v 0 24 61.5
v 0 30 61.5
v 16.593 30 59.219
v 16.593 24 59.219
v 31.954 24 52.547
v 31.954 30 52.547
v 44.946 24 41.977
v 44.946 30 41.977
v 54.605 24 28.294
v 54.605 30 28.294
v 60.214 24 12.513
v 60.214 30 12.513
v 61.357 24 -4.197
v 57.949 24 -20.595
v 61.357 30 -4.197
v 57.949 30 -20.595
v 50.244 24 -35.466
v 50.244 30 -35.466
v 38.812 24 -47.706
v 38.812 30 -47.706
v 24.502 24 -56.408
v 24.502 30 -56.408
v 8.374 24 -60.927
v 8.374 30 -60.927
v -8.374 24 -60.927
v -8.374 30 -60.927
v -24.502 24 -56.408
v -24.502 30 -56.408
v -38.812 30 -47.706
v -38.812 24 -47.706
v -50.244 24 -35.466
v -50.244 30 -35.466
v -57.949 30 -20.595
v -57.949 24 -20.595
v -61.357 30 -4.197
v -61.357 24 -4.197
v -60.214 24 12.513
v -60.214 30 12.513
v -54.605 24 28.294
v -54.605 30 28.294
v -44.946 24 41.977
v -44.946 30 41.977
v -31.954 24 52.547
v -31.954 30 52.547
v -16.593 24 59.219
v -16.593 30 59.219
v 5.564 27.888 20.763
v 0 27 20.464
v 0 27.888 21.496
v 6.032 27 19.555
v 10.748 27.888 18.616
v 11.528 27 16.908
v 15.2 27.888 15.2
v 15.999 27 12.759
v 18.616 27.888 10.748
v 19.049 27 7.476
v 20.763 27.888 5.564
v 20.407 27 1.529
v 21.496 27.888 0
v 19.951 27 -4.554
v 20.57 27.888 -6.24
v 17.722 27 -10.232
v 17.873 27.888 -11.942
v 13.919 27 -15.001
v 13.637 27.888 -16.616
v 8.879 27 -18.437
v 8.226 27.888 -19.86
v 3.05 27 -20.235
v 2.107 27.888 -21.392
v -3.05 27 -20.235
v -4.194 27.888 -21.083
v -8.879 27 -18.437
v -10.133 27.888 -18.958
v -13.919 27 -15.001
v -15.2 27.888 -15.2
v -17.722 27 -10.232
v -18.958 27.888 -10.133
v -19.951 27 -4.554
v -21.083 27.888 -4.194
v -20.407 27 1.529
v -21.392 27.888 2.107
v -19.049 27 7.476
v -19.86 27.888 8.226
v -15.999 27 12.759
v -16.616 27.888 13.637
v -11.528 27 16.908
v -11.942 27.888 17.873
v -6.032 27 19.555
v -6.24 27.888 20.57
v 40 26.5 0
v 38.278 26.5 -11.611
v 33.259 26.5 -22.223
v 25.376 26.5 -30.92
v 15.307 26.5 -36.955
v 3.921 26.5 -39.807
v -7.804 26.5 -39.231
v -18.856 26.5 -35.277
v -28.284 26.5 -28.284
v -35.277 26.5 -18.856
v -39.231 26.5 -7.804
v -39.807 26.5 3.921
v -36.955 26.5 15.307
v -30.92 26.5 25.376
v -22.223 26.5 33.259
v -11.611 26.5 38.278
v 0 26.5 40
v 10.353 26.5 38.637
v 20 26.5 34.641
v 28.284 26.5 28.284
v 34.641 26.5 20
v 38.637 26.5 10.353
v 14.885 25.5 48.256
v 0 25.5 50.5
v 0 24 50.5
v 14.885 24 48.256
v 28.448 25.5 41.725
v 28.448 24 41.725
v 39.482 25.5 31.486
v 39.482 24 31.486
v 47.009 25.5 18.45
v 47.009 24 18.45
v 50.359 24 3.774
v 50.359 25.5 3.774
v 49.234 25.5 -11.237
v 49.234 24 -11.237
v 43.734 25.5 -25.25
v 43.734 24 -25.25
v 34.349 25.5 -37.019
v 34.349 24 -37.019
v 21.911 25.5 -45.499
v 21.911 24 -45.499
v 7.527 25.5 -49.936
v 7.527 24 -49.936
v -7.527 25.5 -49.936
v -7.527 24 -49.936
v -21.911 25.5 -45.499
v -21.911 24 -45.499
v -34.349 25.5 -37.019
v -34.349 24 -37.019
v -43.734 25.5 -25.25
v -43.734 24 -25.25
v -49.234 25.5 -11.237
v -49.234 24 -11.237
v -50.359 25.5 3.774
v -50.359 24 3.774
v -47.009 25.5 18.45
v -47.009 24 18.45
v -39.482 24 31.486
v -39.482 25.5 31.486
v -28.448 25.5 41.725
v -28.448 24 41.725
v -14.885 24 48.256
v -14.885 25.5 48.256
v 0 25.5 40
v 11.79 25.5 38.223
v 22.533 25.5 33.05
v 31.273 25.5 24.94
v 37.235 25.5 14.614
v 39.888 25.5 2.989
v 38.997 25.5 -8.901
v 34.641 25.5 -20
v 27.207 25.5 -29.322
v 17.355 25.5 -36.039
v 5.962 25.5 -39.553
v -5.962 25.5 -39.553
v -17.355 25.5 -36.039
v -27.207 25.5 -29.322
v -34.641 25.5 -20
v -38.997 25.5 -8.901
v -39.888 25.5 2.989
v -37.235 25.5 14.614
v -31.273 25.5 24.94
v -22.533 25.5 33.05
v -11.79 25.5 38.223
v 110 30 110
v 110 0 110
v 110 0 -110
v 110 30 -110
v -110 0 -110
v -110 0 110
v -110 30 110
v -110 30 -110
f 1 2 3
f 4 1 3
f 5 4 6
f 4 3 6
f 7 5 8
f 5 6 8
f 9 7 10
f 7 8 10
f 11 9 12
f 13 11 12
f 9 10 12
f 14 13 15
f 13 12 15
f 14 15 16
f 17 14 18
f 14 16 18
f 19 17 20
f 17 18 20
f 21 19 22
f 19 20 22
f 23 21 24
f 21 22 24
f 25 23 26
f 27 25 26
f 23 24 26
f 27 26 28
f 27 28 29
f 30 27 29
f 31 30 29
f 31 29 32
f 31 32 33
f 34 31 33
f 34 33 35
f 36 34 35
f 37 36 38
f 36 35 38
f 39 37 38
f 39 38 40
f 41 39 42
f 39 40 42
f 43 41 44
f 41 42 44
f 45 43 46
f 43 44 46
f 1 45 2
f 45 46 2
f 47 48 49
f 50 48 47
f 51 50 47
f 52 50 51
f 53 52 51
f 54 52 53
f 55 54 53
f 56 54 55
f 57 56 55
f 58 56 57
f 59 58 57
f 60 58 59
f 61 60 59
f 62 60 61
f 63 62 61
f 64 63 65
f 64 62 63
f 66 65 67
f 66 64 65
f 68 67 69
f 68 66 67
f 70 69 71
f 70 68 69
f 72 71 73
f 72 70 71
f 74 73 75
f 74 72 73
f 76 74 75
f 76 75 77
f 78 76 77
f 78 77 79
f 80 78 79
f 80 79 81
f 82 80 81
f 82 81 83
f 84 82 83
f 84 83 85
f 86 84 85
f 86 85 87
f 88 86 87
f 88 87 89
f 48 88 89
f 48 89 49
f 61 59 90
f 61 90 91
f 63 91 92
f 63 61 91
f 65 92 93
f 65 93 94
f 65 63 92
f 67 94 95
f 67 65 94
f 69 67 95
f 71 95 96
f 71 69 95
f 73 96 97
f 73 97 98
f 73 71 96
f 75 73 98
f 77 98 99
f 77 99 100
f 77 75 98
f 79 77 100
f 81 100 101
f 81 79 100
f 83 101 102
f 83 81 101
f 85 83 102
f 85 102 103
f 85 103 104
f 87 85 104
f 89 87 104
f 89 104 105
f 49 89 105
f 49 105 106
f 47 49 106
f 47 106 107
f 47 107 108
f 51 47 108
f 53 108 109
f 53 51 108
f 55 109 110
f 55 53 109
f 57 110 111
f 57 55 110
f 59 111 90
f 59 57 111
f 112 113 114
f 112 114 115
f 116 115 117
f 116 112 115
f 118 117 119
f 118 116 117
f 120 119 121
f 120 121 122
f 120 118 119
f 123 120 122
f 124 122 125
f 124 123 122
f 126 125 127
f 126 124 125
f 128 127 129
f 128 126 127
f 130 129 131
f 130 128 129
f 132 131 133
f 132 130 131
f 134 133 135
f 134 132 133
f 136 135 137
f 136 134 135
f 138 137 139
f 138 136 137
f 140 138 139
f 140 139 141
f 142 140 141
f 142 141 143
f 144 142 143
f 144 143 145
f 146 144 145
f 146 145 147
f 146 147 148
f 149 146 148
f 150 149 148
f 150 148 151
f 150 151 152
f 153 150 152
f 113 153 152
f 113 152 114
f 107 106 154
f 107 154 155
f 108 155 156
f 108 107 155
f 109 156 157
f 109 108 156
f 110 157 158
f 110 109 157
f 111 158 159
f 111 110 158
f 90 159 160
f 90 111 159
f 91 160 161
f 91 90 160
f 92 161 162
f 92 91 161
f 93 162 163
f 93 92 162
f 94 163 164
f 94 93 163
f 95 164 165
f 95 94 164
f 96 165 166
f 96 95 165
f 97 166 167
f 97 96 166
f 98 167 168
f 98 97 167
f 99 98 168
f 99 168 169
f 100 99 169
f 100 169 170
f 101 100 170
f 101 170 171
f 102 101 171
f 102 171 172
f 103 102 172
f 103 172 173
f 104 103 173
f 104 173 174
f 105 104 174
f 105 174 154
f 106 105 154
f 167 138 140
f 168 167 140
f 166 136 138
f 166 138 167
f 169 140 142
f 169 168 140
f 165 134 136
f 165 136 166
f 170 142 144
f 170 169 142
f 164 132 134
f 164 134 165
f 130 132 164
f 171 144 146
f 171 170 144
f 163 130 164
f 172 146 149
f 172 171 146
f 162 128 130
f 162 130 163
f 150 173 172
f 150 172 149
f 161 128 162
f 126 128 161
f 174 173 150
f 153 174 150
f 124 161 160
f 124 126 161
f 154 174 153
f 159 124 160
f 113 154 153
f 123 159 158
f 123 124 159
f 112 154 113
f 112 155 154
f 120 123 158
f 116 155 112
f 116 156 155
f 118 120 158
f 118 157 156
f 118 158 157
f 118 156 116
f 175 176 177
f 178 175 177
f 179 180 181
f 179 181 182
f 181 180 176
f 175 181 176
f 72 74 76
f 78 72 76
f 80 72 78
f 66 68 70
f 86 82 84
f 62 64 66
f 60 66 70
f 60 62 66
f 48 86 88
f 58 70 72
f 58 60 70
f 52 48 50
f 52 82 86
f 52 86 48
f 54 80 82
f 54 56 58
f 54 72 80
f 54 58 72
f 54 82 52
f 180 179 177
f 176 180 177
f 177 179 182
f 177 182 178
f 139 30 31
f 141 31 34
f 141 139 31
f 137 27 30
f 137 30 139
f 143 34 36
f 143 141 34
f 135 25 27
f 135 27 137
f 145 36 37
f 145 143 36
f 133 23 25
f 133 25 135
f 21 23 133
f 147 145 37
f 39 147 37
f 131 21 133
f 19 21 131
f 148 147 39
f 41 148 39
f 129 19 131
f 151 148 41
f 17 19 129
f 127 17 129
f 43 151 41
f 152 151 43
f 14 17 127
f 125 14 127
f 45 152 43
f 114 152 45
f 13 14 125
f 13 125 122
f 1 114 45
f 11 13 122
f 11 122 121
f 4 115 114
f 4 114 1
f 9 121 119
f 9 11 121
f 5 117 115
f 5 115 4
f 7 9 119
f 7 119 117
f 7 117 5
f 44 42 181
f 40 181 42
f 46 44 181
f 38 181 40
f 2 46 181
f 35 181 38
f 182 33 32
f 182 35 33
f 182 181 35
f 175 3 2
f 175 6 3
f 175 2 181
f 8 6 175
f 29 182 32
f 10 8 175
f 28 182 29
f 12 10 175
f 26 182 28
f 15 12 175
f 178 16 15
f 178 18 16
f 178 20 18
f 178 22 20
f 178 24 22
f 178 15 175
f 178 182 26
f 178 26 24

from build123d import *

# Parameters (mm, degrees)
SKETCH1_W           = 220
SKETCH1_H           = 220
BOSS_EXTRUDE1_DEPTH = 30
SKETCH2_R           = 61.5
SKETCH2_R_2         = 50.5
CUT_EXTRUDE1_DEPTH  = 6
SKETCH3_R           = 50.5
SKETCH3_R_2         = 40
CUT_EXTRUDE2_DEPTH  = 4.5
SKETCH4_R           = 40
CUT_EXTRUDE3_DEPTH  = 3.5
SKETCH5_R           = 40
SKETCH6_R           = 20
SKETCH8_R           = 20
CUT_EXTRUDE4_DEPTH  = 1
CHAMFER1_SIZE       = 1.5
CHAMFER1_SIZE_2     = 1.399267753


with BuildPart() as part:
    # Sketch1 → Boss-Extrude1 (new body)
    with BuildSketch(Plane(origin=(0, 0, 0), x_dir=(1, 0, 0), z_dir=(0, 1, 0))):
        Rectangle(SKETCH1_W, SKETCH1_H)
    extrude(amount=BOSS_EXTRUDE1_DEPTH)

    # Sketch2 → Cut-Extrude1 (cut)
    with BuildSketch(Plane(origin=(0, 30, 0), x_dir=(1, 0, 0), z_dir=(0, 1, 0))):
        with Locations(Location((0, 0, 0), (0, 0, 270))):
            Circle(SKETCH2_R)
        with Locations(Location((0, 0, 0), (0, 0, 270))):
            Circle(SKETCH2_R_2, mode=Mode.SUBTRACT)
    extrude(amount=-CUT_EXTRUDE1_DEPTH, mode=Mode.SUBTRACT)

    # Sketch3 → Cut-Extrude2 (cut)
    with BuildSketch(Plane(origin=(0, 30, 0), x_dir=(1, 0, 0), z_dir=(0, 1, 0))):
        with Locations(Location((0, 0, 0), (0, 0, 270))):
            Circle(SKETCH3_R)
        with Locations(Location((0, 0, 0), (0, 0, 270))):
            Circle(SKETCH3_R_2, mode=Mode.SUBTRACT)
    extrude(amount=-CUT_EXTRUDE2_DEPTH, mode=Mode.SUBTRACT)

    # Sketch4 → Cut-Extrude3 (cut)
    with BuildSketch(Plane(origin=(0, 30, 0), x_dir=(1, 0, 0), z_dir=(0, 1, 0))):
        with Locations(Location((0, 0, 0), (0, 0, 270))):
            Circle(SKETCH4_R)
    extrude(amount=-CUT_EXTRUDE3_DEPTH, mode=Mode.SUBTRACT)

    # Sketch5 → Loft1 section 0
    with BuildSketch(Plane(origin=(0, 26.5, 0), x_dir=(1, 0, 0), z_dir=(0, 1, 0))):
        Circle(SKETCH5_R)
    # Sketch6 → Loft1 section 1
    with BuildSketch(Plane(origin=(0, 28, 0), x_dir=(1, 0, 0), z_dir=(0, 1, 0))):
        Circle(SKETCH6_R)
    loft()

    # Sketch8 → Cut-Extrude4 (cut)
    with BuildSketch(Plane(origin=(0, 28, 0), x_dir=(1, 0, 0), z_dir=(0, 1, 0))):
        with Locations(Location((0, 0, 0), (0, 0, 270))):
            Circle(SKETCH8_R)
    extrude(amount=-CUT_EXTRUDE4_DEPTH, mode=Mode.SUBTRACT)

    # Chamfer1
    # the kernel refuses this chamfer: 1.5, 1.399267753 mm, written as the material it takes off along each edge
    with BuildSketch(Plane(origin=(0, 28, 0), x_dir=(1, 0, 0), z_dir=(0, 0, 1))) as chamfer1_piece_1_section:
        Polygon((20 + CHAMFER1_SIZE * 0.997199309888, -CHAMFER1_SIZE * 0.0747899482416), (20, -CHAMFER1_SIZE_2), (20, 0), align=None)
    chamfer1_piece_1 = revolve(axis=Axis((0, 28, 0), (0, 1, 0)), revolution_arc=270, mode=Mode.PRIVATE)
    chamfer1_piece_1 = split(chamfer1_piece_1, bisect_by=Plane(origin=(-14.829664254, 27, -14.829664254), z_dir=(0, 1, 0)), keep=Keep.TOP, mode=Mode.PRIVATE)
    add(chamfer1_piece_1, mode=Mode.SUBTRACT)
    with BuildSketch(Plane(origin=(0, 28, 0), x_dir=(0, 0, 1), z_dir=(-1, 0, 0))) as chamfer1_piece_2_section:
        Polygon((20 + CHAMFER1_SIZE * 0.997199309888, -CHAMFER1_SIZE * 0.0747899482416), (20, -CHAMFER1_SIZE_2), (20, 0), align=None)
    chamfer1_piece_2 = revolve(axis=Axis((0, 28, 0), (0, 1, 0)), revolution_arc=90, mode=Mode.PRIVATE)
    chamfer1_piece_2 = split(chamfer1_piece_2, bisect_by=Plane(origin=(14.836241564, 27, 14.836241564), z_dir=(0, 1, 0)), keep=Keep.TOP, mode=Mode.PRIVATE)
    add(chamfer1_piece_2, mode=Mode.SUBTRACT)


solid = part.part
